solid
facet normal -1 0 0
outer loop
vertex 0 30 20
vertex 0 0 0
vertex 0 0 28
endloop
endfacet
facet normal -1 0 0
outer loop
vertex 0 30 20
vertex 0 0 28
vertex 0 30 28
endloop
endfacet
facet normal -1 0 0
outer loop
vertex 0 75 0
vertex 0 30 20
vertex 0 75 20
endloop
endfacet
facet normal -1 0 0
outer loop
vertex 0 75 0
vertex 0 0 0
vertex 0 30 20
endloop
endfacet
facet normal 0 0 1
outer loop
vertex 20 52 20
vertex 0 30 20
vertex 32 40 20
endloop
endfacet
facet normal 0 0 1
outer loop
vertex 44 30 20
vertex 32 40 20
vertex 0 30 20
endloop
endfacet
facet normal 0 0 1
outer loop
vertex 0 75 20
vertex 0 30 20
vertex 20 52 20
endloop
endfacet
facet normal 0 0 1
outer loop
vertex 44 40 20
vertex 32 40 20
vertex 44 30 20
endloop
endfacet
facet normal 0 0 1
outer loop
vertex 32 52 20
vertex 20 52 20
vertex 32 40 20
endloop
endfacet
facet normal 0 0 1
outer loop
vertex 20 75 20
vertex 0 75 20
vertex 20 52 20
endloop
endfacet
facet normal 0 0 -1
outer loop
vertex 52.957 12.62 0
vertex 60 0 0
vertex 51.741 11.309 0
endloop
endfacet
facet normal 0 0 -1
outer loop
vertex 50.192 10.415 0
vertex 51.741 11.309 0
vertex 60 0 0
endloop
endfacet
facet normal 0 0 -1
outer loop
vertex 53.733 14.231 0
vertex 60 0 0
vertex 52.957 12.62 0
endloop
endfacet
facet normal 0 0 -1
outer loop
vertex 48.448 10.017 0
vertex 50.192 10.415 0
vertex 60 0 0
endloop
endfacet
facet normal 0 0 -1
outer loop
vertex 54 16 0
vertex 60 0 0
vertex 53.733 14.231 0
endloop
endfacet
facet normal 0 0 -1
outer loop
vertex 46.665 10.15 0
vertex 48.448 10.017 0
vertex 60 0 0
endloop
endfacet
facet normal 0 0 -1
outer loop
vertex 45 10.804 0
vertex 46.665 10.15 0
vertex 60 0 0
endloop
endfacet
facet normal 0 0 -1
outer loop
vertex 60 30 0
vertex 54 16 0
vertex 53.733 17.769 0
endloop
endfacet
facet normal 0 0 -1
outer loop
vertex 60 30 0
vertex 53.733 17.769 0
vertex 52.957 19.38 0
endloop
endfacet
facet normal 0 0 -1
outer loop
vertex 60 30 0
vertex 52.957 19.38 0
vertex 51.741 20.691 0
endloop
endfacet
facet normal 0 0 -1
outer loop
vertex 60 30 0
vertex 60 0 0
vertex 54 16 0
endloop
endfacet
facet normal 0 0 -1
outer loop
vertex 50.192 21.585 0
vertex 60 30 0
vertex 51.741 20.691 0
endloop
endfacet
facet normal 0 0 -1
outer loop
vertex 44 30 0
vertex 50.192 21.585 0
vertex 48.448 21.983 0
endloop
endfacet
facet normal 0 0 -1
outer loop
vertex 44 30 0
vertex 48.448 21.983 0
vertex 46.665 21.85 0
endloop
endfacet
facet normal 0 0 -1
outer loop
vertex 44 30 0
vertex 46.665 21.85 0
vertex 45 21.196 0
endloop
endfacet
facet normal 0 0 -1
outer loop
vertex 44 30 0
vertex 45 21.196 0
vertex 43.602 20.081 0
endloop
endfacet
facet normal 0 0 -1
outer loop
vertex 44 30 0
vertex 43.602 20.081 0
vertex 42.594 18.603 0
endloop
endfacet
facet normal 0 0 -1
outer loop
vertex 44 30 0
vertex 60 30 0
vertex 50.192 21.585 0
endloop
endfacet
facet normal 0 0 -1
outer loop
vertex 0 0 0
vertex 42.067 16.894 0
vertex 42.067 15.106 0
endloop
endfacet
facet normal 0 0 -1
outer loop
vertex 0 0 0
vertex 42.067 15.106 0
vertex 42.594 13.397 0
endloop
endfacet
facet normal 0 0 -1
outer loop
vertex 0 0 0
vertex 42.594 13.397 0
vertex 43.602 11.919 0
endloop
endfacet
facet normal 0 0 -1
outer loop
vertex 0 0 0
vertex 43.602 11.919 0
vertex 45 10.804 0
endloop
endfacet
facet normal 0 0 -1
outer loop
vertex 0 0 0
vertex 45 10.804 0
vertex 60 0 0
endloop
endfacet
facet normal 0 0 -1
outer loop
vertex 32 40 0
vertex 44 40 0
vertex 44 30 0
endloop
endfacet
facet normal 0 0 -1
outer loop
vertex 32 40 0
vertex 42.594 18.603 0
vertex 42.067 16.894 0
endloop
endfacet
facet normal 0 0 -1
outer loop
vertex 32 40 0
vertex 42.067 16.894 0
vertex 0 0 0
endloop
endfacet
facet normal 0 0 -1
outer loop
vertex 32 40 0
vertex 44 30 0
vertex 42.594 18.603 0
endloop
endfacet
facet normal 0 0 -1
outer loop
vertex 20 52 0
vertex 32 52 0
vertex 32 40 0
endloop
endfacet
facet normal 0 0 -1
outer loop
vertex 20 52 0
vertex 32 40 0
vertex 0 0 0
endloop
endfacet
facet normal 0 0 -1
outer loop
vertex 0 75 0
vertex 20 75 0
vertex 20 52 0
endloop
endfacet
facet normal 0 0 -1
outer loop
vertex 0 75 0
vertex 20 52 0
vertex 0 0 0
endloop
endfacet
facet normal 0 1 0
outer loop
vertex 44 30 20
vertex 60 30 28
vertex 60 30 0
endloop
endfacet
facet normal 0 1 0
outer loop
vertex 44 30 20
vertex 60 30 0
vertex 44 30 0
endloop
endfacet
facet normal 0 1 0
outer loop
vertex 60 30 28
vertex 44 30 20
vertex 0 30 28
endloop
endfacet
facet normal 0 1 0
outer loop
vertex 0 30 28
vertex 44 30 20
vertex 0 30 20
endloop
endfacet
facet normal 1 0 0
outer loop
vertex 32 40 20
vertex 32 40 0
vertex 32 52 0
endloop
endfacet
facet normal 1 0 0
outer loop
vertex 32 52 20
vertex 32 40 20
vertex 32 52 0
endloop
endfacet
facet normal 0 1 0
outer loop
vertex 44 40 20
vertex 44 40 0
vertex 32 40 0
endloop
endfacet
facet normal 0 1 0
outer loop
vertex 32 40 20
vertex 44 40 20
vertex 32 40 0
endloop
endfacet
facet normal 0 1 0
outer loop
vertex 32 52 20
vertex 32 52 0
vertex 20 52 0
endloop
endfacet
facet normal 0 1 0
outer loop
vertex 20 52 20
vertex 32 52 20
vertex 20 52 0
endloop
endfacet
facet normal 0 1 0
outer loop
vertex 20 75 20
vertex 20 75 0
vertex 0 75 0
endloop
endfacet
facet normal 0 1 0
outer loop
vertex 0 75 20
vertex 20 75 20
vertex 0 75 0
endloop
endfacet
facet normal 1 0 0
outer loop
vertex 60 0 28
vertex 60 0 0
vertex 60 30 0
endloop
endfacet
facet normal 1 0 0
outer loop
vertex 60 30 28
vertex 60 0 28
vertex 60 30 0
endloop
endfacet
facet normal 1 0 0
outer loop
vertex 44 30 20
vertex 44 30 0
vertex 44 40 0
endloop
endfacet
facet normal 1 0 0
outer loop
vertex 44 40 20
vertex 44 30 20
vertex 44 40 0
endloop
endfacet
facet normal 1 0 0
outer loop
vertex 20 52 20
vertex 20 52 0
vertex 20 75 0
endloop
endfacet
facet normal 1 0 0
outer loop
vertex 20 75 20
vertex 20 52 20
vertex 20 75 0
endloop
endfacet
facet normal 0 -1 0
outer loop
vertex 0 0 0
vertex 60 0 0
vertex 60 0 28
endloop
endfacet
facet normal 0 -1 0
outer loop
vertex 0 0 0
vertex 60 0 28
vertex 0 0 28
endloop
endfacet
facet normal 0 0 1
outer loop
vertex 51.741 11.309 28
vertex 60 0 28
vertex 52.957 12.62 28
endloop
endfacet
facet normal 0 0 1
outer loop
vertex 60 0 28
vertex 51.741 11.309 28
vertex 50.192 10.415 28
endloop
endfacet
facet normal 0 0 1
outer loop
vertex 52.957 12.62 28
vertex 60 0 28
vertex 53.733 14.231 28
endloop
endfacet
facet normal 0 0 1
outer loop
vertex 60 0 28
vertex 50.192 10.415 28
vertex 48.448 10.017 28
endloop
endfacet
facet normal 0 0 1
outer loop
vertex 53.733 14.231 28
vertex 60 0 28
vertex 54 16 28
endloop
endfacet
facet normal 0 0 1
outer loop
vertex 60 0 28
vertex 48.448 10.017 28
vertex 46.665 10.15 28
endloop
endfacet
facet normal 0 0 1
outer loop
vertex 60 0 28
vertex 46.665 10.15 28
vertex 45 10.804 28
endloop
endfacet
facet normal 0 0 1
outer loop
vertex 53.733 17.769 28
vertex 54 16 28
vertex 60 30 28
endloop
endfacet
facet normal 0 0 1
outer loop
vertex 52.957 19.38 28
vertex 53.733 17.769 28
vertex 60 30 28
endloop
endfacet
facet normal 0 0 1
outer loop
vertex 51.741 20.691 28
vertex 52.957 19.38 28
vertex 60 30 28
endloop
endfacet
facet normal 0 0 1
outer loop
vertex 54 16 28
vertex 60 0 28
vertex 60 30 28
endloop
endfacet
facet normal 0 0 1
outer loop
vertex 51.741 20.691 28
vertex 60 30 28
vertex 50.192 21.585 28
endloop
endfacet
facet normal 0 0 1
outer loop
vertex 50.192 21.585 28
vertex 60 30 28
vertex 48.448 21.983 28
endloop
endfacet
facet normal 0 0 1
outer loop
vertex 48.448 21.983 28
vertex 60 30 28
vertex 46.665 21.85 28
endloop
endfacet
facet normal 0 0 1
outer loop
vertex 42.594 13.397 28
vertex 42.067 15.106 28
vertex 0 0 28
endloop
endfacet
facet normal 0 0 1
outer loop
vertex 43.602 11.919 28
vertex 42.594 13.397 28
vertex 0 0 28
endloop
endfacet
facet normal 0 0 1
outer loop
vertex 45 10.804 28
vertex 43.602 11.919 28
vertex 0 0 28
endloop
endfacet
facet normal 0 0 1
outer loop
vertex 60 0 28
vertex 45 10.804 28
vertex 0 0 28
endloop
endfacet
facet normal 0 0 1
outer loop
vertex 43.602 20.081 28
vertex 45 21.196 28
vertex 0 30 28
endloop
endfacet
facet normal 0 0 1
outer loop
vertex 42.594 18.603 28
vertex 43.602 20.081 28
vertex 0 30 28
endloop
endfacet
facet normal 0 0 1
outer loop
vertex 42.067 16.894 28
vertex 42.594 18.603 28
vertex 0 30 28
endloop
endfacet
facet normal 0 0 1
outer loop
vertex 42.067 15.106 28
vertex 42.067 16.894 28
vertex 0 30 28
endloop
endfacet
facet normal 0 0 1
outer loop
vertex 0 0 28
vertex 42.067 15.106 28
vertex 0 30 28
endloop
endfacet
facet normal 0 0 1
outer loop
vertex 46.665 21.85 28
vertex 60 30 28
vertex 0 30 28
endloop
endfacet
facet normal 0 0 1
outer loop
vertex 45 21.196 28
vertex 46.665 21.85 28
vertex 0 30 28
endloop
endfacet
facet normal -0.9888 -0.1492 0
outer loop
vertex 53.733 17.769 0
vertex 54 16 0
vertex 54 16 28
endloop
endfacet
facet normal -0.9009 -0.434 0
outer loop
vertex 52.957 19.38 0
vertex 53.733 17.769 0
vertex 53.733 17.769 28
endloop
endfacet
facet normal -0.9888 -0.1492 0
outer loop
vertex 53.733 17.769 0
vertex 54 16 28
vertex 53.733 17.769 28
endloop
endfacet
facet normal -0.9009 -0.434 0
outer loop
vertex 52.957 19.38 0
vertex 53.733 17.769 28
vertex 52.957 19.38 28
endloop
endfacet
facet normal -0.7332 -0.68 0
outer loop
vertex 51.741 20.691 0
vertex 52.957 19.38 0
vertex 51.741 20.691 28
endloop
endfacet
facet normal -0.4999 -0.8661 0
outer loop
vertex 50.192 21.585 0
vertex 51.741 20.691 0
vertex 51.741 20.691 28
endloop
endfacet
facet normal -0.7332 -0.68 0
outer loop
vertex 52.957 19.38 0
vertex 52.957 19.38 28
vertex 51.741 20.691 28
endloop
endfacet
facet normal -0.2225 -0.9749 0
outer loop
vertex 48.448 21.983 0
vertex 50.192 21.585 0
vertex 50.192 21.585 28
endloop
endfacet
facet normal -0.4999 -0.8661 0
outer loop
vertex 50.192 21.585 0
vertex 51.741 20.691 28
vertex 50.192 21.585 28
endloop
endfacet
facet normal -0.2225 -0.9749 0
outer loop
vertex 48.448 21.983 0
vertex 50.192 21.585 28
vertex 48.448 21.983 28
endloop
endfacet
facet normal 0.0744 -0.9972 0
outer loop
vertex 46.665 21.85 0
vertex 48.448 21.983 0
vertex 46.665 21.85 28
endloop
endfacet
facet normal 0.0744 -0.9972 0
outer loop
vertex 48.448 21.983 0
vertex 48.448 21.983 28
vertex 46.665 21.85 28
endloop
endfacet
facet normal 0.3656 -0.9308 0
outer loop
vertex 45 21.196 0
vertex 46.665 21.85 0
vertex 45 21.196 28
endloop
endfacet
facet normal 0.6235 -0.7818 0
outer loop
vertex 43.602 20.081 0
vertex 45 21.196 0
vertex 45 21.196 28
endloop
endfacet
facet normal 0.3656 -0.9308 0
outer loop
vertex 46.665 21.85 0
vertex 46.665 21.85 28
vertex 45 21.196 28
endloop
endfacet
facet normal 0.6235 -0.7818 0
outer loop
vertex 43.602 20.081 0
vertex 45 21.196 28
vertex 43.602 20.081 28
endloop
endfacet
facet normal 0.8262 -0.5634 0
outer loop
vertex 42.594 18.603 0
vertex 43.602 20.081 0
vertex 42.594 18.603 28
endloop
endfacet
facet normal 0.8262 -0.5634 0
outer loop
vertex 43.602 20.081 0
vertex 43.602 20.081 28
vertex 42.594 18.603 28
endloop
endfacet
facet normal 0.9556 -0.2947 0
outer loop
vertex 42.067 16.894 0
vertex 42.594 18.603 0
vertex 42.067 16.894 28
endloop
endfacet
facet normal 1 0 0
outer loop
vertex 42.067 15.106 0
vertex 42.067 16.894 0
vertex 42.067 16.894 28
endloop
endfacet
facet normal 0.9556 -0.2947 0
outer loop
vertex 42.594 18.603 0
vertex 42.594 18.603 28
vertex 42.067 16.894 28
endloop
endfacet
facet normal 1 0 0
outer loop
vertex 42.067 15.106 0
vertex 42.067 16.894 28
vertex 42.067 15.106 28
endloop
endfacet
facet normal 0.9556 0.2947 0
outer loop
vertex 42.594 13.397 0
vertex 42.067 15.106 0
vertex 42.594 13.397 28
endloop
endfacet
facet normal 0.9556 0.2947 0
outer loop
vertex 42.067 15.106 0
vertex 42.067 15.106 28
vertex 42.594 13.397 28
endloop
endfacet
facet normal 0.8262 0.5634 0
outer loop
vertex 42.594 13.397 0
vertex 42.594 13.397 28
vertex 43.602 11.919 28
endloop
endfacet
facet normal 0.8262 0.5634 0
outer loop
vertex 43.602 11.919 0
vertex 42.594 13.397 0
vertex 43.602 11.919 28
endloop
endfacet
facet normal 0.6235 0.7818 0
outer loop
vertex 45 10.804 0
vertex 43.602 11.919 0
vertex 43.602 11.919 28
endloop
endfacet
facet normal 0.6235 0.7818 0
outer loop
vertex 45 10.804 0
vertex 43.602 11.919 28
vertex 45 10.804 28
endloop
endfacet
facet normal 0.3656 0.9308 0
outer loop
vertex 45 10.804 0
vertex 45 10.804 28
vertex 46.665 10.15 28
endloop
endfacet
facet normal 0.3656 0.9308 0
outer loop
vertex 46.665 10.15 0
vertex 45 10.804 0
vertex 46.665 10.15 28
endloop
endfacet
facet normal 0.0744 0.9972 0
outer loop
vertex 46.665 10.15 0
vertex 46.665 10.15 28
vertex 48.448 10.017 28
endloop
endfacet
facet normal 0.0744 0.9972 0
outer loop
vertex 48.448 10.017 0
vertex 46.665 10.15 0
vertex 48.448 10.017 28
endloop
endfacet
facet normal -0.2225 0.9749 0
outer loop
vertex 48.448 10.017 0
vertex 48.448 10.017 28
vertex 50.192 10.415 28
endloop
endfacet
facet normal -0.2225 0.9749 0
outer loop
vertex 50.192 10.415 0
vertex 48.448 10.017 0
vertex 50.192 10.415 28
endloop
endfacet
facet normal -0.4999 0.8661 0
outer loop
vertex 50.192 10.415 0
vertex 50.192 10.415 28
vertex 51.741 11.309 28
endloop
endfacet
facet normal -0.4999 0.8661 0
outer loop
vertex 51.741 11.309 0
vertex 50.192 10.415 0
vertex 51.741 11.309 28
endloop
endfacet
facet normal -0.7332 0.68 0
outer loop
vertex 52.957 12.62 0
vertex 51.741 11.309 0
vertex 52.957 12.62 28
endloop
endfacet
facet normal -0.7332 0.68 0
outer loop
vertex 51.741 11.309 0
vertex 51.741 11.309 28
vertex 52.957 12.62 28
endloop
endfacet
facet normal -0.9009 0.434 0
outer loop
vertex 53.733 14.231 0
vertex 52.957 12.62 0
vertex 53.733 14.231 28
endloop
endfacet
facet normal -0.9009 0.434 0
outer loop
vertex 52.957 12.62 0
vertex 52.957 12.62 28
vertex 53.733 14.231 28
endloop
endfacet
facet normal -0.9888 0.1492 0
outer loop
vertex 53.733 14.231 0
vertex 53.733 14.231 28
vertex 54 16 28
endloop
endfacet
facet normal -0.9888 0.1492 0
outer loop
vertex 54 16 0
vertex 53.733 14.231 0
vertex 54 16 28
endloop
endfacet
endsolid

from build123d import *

# Parameters (mm, degrees)
BOSS_EXTRUDE1_DEPTH = 20
SKETCH2_W           = 60
SKETCH2_H           = 30
BOSS_EXTRUDE2_DEPTH = 28
SKETCH3_R           = 6
CUT_EXTRUDE1_DEPTH  = 28


with BuildPart() as part:
    # Sketch1 → Boss-Extrude1 (new body)
    with BuildSketch(Plane.XY):
        Polygon((0, 75), (0, 30), (44, 30), (44, 40), (32, 40), (32, 52), (20, 52), (20, 75), align=None)
    extrude(amount=BOSS_EXTRUDE1_DEPTH)

    # Sketch2 → Boss-Extrude2 (add)
    with BuildSketch(Plane(origin=(0, 0, 0), x_dir=(-1, 0, 0), z_dir=(0, 0, -1))):
        with Locations((-30, 15)):
            Rectangle(SKETCH2_W, SKETCH2_H)
    extrude(amount=-BOSS_EXTRUDE2_DEPTH)

    # Sketch3 → Cut-Extrude1 (cut)
    with BuildSketch(Plane.XY.offset(28)):
        with Locations((48, 16)):
            Circle(SKETCH3_R)
    extrude(amount=-CUT_EXTRUDE1_DEPTH, mode=Mode.SUBTRACT)


solid = part.part
